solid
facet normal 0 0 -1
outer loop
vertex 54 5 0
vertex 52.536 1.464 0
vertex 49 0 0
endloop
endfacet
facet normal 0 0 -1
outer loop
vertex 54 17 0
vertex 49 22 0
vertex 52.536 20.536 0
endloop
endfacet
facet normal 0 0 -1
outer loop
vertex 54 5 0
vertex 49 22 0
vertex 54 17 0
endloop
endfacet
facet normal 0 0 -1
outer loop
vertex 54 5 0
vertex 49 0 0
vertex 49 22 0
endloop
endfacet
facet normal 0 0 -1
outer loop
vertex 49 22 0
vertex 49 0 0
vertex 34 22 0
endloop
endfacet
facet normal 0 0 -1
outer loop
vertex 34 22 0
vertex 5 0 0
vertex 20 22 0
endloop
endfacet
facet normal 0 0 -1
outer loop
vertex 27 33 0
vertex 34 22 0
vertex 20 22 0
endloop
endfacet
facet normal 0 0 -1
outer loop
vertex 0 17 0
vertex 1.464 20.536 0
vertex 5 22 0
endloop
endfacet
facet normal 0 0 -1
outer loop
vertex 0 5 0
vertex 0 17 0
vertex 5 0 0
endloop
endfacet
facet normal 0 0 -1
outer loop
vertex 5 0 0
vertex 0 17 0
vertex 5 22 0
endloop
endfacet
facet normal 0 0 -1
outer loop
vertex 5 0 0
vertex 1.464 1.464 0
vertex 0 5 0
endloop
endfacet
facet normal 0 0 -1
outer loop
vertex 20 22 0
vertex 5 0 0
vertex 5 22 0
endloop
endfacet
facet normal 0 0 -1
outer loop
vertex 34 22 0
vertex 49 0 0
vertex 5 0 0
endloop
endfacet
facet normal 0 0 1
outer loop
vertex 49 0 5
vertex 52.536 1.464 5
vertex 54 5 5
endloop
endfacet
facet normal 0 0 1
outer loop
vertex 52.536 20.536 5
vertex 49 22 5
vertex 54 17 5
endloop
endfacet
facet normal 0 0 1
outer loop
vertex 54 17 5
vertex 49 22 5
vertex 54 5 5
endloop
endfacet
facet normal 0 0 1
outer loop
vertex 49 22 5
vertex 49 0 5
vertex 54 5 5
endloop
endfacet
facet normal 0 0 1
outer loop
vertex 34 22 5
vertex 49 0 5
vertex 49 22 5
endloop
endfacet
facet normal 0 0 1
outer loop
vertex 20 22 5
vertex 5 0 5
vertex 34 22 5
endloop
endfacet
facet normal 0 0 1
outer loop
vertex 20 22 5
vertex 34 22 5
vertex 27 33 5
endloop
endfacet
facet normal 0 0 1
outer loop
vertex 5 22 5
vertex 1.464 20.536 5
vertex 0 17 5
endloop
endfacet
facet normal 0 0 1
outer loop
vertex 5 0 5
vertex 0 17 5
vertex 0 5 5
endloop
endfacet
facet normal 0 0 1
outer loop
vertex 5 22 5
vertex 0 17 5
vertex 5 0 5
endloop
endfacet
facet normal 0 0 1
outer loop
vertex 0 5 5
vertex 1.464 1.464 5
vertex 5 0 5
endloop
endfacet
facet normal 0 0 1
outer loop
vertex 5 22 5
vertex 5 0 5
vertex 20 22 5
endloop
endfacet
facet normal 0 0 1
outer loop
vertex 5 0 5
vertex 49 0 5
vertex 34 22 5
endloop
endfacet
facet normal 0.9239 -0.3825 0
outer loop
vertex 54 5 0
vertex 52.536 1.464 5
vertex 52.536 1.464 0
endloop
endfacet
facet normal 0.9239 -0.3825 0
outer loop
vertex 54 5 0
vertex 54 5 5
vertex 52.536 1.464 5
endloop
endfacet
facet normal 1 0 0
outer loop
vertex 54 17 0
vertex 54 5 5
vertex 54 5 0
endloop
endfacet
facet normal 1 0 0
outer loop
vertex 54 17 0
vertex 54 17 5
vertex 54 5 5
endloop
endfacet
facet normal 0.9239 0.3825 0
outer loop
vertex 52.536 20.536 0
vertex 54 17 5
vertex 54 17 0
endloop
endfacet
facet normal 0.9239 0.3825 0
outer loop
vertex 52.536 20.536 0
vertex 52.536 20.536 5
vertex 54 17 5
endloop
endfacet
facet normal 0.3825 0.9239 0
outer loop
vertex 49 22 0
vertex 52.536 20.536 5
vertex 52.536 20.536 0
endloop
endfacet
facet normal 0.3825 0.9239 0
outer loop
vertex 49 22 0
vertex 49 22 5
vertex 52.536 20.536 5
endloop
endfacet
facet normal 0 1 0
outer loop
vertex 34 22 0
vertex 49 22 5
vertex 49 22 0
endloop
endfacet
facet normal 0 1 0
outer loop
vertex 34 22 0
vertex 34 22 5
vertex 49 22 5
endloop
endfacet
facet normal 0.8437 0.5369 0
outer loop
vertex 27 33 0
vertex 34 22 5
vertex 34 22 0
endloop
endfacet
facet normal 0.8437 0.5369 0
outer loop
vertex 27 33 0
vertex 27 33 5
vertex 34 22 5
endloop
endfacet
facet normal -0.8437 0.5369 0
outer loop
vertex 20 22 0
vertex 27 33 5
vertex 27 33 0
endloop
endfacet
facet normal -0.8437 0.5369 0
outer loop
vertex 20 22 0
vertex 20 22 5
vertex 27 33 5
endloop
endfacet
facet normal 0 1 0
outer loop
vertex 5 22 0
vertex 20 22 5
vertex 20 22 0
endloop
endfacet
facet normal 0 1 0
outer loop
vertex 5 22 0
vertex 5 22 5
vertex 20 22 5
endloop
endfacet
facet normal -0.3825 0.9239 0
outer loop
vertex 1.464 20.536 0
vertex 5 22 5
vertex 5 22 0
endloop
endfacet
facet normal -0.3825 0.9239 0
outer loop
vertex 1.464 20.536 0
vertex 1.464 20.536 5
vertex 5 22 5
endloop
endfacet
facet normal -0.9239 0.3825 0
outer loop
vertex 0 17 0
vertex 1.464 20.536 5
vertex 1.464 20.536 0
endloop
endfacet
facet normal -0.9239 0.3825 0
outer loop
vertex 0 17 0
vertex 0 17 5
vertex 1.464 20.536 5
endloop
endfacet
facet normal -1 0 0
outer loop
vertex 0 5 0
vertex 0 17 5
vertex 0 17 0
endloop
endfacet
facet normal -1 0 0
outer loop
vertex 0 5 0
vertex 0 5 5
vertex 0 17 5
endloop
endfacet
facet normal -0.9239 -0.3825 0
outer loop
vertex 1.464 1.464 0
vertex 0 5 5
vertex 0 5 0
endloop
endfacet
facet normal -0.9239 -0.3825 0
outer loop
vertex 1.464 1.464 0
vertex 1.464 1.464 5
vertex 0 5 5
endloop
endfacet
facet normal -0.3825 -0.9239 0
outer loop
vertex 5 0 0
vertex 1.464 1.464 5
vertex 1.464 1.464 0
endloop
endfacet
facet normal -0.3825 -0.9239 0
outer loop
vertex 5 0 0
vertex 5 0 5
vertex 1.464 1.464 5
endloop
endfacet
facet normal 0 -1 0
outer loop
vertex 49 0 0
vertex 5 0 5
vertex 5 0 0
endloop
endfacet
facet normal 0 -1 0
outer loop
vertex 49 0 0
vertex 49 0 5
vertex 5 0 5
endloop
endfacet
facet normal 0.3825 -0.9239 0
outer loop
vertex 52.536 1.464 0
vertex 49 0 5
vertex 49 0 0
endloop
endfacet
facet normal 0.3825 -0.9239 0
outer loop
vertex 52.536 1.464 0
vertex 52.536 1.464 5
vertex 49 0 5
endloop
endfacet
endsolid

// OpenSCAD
$fn = 32;

// ----------------------------------------------------------------------
// Ratchet pawl: 54 x 22 mm body, beak 11 mm сверху
// ----------------------------------------------------------------------

// --- parameters (mm) ---
profile_height = 5;       // extrusion height
profile_points = 15;      // points of the closed outline

profile = [[0, 5], [1.464, 1.464], [5, 0], [49, 0], [52.536, 1.464], [54, 5], [54, 17], [52.536, 20.536], [49, 22], [34, 22], [27, 33], [20, 22], [5, 22], [1.464, 20.536], [0, 17]];  // single closed polygon, 15 points, counter clockwise

// --- the one profile operation ---
linear_extrude(height = profile_height) polygon(points = profile);
